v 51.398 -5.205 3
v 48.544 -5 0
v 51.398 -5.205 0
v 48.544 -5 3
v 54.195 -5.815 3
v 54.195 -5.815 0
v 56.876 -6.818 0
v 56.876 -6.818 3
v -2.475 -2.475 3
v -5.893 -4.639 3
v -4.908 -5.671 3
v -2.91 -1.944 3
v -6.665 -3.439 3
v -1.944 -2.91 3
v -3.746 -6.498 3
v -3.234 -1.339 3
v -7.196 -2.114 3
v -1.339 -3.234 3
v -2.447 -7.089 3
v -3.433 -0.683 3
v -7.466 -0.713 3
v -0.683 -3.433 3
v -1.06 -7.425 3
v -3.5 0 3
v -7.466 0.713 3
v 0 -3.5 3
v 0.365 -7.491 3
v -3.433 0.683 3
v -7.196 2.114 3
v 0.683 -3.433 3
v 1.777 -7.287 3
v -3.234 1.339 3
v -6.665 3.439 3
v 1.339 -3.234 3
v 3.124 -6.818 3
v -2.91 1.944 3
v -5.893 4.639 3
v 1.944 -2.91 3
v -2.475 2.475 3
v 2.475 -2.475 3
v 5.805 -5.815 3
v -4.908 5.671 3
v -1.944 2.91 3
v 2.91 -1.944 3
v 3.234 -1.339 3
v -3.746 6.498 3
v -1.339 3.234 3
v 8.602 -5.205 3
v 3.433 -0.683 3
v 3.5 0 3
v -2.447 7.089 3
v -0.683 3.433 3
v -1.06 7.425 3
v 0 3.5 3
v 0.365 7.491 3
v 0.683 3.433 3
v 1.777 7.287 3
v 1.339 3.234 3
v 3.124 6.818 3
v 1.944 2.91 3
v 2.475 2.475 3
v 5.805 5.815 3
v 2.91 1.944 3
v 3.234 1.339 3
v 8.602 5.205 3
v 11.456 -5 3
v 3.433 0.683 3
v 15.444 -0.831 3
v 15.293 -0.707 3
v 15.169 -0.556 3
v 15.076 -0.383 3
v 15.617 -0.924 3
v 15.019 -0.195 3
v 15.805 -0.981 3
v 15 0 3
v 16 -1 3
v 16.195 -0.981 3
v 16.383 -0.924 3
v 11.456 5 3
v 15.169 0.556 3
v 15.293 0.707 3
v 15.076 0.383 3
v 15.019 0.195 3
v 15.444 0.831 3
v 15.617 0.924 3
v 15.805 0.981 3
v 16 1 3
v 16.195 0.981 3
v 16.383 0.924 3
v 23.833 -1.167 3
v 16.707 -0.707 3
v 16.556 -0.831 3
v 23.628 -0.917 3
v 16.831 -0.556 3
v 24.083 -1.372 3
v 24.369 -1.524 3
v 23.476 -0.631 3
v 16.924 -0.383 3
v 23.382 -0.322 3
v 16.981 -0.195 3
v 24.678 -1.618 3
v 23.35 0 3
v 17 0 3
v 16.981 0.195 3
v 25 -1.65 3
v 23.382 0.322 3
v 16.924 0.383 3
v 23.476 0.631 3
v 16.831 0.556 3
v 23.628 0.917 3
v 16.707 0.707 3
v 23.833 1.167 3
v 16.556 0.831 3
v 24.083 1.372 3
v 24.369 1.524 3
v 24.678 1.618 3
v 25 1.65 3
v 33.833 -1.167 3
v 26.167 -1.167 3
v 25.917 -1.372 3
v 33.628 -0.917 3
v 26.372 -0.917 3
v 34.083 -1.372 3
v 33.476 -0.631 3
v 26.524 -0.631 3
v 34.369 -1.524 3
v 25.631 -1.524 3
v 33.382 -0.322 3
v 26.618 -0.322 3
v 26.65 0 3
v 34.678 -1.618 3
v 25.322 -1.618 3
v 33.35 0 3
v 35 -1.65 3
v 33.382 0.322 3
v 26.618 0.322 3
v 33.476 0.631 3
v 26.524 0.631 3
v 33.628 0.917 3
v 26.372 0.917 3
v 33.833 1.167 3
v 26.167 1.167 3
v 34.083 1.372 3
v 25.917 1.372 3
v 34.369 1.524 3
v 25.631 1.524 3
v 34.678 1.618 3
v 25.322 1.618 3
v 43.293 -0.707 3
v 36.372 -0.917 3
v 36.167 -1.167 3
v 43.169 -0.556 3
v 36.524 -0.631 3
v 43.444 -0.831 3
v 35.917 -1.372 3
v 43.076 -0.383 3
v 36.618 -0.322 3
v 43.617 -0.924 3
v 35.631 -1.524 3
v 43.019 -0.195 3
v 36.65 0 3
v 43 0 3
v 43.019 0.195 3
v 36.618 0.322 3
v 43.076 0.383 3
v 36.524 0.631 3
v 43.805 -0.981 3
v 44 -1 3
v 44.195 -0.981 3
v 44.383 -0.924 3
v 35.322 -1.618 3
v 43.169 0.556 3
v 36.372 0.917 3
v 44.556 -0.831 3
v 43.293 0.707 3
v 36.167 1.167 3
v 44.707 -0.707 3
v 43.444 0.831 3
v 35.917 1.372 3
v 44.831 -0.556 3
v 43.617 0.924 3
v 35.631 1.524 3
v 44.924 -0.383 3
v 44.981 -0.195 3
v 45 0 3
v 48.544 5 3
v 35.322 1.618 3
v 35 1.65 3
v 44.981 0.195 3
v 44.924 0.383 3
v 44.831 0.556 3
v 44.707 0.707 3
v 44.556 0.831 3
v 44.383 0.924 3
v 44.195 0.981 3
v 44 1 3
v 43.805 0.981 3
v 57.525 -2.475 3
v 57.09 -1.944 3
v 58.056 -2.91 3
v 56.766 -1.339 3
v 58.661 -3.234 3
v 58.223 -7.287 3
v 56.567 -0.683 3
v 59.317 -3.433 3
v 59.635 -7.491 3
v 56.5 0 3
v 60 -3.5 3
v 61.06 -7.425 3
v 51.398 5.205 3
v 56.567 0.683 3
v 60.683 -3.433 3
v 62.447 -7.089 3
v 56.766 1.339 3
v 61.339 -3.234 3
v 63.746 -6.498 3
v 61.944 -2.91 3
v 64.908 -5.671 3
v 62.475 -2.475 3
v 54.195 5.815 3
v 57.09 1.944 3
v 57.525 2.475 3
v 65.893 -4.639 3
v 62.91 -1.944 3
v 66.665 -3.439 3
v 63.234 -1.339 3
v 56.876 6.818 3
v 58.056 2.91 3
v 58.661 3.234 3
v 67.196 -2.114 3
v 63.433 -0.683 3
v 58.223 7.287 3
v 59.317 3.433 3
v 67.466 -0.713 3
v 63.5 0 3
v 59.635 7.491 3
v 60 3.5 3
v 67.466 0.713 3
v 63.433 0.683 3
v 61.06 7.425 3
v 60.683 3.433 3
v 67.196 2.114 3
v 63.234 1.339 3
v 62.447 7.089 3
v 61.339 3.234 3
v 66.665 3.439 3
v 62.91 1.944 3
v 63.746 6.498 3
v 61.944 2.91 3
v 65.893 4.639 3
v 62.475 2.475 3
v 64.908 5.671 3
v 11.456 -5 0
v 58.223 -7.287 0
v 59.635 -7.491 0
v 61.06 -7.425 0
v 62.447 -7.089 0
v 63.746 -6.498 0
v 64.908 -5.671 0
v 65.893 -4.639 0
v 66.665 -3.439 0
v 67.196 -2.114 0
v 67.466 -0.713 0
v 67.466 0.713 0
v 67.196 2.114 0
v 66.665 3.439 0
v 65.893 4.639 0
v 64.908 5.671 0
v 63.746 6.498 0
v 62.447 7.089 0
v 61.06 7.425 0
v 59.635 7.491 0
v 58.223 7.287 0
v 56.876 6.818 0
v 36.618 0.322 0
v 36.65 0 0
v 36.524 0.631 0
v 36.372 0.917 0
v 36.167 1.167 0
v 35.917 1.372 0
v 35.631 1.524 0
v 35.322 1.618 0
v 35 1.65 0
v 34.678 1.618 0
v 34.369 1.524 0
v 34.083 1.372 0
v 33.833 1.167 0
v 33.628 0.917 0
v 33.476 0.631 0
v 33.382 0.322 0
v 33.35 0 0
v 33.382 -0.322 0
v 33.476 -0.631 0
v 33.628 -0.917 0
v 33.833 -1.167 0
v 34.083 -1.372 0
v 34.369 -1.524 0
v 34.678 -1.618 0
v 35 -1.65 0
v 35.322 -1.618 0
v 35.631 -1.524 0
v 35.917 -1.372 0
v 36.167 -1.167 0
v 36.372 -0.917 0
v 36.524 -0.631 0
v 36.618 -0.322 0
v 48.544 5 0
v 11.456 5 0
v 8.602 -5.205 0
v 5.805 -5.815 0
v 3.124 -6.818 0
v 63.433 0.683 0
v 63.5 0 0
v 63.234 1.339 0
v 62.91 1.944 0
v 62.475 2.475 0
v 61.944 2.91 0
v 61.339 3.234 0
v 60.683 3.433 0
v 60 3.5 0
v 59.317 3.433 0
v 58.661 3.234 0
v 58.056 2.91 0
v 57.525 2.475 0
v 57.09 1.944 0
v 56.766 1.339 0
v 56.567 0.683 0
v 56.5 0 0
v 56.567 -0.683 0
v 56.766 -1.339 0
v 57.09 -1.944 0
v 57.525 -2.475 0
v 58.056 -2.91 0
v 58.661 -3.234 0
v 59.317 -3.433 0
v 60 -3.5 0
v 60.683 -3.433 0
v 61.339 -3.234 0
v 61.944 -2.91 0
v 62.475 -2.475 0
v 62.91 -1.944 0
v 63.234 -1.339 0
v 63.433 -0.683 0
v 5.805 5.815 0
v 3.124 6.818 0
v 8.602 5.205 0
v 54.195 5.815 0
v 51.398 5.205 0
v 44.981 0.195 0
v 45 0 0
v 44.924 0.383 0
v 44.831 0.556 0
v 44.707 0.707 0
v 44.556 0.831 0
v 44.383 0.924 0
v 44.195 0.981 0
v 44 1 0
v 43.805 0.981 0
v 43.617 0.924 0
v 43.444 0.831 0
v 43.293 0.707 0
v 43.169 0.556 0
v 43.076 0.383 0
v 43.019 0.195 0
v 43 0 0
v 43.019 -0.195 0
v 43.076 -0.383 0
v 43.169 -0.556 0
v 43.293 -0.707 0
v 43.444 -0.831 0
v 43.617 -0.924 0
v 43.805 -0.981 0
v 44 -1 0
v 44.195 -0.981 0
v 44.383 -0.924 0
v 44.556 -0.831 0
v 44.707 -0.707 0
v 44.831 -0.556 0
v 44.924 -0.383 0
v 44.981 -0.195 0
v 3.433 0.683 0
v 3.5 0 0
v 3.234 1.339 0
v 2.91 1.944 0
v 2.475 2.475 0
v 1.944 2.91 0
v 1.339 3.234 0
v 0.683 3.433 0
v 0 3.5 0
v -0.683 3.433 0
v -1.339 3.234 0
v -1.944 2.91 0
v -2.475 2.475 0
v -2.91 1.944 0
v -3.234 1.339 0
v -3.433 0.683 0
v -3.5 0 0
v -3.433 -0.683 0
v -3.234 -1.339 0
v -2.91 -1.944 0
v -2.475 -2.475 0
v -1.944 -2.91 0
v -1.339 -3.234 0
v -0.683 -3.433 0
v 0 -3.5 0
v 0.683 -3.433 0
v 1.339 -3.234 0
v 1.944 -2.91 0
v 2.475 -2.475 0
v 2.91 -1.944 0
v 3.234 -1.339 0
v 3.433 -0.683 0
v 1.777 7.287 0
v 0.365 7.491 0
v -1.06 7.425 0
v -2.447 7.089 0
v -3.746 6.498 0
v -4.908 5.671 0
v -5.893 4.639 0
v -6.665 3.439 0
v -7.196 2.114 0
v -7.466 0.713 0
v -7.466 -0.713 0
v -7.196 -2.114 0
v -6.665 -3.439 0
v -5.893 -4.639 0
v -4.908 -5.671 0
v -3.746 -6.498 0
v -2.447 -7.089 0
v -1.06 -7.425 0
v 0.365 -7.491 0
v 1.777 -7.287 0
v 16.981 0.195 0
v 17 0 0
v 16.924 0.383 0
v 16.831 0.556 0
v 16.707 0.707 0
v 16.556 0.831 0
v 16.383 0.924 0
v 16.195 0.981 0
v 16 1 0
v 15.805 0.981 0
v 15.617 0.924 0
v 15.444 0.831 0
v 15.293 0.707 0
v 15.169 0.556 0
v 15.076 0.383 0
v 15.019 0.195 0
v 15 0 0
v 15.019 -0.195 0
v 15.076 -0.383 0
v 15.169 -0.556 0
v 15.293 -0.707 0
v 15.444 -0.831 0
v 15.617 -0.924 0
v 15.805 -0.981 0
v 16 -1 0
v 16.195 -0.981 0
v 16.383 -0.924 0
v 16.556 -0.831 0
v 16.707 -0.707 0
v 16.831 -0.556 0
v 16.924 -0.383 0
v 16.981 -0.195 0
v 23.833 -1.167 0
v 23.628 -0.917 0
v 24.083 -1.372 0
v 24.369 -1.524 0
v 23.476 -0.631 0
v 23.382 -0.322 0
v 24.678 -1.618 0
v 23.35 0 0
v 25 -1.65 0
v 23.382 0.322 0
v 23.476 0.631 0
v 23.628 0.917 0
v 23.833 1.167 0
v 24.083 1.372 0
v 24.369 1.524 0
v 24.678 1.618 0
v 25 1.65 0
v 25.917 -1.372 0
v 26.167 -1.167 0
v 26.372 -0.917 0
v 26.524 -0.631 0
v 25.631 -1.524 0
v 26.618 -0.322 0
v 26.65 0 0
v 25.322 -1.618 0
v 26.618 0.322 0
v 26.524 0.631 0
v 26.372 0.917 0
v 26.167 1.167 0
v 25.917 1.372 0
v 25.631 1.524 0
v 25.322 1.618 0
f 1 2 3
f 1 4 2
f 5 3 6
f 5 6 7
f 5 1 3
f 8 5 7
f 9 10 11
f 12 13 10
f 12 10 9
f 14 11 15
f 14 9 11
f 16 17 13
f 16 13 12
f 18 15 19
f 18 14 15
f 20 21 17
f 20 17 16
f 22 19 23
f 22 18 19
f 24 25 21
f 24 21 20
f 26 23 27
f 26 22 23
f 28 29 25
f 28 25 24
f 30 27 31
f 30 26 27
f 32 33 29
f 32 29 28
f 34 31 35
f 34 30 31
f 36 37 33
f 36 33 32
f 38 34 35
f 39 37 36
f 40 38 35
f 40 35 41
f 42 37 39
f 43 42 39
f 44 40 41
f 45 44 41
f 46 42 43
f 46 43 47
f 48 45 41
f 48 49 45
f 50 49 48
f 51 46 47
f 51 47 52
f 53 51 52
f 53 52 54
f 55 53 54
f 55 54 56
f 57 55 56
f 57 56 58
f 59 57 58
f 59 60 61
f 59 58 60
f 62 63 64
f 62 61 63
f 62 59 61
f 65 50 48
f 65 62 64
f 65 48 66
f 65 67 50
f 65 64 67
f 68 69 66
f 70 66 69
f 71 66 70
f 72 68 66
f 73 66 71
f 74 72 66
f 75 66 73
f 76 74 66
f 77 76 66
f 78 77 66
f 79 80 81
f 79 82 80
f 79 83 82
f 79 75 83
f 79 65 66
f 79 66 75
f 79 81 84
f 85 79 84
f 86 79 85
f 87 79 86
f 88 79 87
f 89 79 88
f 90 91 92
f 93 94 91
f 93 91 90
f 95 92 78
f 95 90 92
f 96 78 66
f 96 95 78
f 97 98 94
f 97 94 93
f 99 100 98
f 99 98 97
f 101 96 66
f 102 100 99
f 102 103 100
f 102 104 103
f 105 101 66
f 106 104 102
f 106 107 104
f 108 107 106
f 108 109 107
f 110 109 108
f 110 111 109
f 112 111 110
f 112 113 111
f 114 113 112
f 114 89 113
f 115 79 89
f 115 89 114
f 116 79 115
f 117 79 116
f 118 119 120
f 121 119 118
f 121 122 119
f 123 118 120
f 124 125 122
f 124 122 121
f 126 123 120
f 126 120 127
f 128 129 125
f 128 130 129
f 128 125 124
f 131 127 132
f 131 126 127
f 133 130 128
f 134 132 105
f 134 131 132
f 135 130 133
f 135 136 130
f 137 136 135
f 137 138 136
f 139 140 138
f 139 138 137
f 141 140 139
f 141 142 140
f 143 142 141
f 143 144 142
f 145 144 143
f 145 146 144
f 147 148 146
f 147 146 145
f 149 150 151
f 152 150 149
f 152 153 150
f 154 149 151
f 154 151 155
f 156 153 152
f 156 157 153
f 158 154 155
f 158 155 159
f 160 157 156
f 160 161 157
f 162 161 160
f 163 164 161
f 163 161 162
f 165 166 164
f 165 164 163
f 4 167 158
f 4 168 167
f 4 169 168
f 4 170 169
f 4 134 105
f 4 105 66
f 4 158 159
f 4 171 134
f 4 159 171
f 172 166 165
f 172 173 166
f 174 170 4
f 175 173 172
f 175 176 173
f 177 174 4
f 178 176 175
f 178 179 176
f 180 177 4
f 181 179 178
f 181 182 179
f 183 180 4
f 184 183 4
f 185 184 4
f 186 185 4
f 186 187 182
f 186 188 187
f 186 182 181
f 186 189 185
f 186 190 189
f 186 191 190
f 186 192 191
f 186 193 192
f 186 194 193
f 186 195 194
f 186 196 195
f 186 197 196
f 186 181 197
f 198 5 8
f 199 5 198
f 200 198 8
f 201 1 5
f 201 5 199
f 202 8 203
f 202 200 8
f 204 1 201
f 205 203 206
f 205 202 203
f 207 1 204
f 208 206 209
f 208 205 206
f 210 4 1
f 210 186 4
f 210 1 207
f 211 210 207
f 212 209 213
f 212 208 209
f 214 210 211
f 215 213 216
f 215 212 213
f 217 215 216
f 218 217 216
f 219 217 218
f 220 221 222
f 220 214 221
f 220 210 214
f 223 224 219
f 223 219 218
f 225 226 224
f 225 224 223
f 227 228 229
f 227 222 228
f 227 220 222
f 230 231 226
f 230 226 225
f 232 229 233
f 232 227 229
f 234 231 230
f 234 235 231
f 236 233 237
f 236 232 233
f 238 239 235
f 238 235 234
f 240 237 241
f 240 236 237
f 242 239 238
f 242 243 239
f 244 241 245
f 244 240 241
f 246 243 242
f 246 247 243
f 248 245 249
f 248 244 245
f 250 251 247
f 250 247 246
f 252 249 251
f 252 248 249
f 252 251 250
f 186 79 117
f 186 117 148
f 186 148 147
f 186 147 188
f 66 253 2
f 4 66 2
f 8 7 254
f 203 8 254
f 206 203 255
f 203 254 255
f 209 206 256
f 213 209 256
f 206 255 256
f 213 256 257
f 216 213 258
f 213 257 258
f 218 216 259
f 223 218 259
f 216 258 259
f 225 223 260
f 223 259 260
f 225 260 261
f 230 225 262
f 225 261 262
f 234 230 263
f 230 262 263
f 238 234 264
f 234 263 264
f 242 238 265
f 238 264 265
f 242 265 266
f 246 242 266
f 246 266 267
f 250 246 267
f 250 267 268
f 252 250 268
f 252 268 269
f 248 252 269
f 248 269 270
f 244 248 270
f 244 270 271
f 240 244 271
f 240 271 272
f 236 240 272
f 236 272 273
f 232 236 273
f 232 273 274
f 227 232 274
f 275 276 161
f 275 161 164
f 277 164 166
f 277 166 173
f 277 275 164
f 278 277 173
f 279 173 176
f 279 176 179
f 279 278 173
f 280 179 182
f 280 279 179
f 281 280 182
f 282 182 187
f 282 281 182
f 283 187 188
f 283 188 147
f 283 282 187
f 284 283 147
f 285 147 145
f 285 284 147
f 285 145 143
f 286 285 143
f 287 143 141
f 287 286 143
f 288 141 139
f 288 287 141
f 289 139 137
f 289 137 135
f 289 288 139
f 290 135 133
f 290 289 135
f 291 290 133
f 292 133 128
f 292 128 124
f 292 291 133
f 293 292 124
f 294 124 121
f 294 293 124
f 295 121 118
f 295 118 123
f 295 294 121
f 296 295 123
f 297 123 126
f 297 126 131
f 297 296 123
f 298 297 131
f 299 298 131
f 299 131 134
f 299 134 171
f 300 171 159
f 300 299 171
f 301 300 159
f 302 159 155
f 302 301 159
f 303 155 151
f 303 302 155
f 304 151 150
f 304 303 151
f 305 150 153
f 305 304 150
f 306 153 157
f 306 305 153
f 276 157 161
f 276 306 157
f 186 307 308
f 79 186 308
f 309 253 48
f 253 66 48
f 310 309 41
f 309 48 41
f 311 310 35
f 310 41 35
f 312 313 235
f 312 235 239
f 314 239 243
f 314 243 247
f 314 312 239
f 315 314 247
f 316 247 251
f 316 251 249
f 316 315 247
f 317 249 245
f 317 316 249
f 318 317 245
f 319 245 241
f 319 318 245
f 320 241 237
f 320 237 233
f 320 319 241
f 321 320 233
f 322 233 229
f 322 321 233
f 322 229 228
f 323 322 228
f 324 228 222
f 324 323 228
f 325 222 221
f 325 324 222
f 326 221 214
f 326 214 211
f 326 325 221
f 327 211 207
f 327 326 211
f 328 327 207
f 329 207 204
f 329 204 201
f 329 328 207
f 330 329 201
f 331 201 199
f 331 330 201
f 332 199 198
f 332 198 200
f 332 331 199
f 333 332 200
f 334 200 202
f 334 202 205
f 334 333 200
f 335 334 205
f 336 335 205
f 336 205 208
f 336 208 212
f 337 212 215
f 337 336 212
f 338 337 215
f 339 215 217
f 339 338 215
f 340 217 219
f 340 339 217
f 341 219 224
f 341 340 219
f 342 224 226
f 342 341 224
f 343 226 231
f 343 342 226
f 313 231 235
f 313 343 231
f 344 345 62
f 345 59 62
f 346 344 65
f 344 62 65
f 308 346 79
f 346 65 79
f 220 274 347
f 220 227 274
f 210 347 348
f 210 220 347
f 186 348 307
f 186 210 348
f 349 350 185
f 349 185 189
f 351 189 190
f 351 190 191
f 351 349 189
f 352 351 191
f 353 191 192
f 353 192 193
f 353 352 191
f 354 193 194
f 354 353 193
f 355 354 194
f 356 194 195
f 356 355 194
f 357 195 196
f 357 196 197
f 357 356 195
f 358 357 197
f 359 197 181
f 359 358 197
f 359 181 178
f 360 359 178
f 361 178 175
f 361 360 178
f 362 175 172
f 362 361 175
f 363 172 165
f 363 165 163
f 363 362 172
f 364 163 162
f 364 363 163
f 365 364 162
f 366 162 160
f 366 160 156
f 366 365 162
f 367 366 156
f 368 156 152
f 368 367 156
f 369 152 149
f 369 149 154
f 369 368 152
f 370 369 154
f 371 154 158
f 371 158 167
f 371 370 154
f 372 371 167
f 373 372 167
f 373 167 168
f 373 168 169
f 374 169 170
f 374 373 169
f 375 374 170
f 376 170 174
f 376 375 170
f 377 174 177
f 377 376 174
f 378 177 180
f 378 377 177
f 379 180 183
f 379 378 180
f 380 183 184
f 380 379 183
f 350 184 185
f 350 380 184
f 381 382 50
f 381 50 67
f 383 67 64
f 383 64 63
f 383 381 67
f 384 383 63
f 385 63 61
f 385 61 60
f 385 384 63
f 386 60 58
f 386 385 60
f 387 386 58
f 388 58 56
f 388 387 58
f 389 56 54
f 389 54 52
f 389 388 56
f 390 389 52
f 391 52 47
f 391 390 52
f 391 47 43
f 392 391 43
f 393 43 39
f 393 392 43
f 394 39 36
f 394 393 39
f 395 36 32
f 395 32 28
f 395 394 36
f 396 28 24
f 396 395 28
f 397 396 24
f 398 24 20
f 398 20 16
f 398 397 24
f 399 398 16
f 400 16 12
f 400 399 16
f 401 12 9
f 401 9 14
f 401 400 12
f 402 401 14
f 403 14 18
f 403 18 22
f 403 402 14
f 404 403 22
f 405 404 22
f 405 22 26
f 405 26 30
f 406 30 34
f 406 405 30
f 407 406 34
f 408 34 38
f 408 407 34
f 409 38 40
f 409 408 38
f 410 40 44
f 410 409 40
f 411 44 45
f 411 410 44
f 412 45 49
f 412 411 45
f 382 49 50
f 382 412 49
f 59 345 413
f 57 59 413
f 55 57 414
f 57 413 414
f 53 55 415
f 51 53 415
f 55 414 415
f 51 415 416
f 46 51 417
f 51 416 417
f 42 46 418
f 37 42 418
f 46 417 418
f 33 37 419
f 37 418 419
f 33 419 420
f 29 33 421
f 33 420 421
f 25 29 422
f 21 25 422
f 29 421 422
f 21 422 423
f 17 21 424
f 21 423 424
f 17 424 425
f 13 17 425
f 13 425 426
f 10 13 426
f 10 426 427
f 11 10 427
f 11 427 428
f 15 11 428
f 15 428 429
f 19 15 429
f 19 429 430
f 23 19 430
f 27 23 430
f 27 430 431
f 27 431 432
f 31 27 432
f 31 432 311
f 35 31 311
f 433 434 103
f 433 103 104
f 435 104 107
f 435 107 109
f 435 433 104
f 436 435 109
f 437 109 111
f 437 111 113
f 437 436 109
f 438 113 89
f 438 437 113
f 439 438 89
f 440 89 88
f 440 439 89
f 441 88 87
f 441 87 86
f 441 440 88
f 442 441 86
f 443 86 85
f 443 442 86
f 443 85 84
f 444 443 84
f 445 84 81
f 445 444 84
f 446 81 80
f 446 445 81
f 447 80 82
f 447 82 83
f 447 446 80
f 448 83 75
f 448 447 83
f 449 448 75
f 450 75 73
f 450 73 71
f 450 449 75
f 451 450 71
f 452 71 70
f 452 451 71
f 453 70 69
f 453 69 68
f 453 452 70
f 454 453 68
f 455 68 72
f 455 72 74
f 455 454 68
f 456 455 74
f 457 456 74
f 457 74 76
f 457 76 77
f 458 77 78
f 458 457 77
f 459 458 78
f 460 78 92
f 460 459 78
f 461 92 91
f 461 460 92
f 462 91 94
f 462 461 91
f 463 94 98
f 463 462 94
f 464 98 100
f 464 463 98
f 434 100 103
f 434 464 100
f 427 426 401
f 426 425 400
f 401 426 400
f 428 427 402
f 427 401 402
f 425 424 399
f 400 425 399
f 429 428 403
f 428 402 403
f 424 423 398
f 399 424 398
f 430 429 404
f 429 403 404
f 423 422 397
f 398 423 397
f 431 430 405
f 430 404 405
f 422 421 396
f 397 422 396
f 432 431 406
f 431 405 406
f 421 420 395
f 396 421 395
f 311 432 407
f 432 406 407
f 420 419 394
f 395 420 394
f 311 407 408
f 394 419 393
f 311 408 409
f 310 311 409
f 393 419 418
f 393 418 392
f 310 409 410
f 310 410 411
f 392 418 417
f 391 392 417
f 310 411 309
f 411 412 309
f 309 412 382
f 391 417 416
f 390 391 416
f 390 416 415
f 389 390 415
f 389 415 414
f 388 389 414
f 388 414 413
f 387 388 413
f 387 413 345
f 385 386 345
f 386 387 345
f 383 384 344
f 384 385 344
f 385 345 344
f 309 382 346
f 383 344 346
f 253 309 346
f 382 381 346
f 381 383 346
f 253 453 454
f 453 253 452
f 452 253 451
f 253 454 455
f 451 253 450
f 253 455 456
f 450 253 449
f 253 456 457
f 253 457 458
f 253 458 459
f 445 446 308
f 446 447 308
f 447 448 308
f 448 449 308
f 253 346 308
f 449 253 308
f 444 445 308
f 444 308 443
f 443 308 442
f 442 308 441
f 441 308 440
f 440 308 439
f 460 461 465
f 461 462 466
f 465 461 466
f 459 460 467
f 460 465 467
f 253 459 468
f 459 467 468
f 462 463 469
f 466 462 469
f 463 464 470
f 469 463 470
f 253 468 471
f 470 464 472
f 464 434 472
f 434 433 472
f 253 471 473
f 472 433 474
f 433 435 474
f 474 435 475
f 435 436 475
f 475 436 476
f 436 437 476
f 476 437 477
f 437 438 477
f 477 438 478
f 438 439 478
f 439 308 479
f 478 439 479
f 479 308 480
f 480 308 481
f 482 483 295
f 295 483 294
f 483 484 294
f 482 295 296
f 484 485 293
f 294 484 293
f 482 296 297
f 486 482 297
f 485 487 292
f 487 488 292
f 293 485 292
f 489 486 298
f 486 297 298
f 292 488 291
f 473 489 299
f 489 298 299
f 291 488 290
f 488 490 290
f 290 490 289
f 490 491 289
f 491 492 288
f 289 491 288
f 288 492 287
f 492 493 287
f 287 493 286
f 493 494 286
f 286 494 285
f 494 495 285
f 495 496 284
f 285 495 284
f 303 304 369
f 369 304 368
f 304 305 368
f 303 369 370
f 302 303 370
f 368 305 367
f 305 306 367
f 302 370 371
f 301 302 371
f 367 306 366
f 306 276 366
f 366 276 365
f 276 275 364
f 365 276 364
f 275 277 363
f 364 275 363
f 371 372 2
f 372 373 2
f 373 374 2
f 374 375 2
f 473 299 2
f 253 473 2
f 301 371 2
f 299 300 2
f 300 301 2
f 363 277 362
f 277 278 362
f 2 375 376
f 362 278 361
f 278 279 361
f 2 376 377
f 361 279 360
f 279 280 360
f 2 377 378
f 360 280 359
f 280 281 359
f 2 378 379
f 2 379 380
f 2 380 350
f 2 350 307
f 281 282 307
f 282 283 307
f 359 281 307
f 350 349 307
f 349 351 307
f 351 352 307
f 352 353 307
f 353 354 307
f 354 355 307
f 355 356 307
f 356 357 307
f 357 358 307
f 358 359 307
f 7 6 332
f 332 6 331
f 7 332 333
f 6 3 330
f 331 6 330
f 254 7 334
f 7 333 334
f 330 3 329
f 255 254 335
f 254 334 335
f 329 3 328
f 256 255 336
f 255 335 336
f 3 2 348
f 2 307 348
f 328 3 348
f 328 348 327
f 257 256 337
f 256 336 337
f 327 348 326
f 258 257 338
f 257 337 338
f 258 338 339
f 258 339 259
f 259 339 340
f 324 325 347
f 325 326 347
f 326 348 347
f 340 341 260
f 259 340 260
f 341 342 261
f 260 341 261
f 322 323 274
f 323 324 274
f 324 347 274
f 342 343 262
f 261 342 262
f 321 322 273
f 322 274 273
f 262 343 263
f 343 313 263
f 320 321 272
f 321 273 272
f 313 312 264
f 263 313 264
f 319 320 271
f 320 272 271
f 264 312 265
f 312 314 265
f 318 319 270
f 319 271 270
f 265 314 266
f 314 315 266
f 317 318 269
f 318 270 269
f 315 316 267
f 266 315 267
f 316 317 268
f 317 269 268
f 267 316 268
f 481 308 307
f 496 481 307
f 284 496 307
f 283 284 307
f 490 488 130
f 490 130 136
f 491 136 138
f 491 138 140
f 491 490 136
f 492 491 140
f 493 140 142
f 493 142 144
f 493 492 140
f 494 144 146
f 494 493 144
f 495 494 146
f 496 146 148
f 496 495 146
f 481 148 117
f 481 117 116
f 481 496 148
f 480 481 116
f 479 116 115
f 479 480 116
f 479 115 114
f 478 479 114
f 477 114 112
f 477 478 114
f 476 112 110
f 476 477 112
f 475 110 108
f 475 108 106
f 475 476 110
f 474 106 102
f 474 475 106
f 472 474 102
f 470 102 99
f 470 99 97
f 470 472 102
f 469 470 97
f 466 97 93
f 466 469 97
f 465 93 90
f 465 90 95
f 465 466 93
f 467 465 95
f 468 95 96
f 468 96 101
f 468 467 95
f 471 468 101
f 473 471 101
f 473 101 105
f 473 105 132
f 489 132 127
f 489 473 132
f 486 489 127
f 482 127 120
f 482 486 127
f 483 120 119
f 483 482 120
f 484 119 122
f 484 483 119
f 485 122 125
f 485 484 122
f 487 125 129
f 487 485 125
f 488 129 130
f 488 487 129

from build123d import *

# Parameters (mm, degrees)
ESBO_O1_R                = 1
ESBO_O1_R_2              = 3.5
ESBO_O1_R_3              = 1.65
RESSALTO_EXTRUS_O1_DEPTH = 3
FILETE1_R                = 20


with BuildPart() as part:
    # Esboço1 → Ressalto-extrusão1 (new body)
    with BuildSketch(Plane.XY):
        with BuildLine():
            Line((5.590169944, -5), (54.409830056, -5))
            ThreePointArc((54.409830056, -5), (67.5, 0), (54.409830056, 5))
            Line((54.409830056, 5), (5.590169944, 5))
            ThreePointArc((5.590169944, 5), (-7.5, 0), (5.590169944, -5))
        make_face()
        with Locations((44, 0)):
            Circle(ESBO_O1_R, mode=Mode.SUBTRACT)
        with Locations((16, 0)):
            Circle(ESBO_O1_R, mode=Mode.SUBTRACT)
        Circle(ESBO_O1_R_2, mode=Mode.SUBTRACT)
        with Locations((60, 0)):
            Circle(ESBO_O1_R_2, mode=Mode.SUBTRACT)
        with Locations((25, 0)):
            Circle(ESBO_O1_R_3, mode=Mode.SUBTRACT)
        with Locations((35, 0)):
            Circle(ESBO_O1_R_3, mode=Mode.SUBTRACT)
    extrude(amount=RESSALTO_EXTRUS_O1_DEPTH)

    # Filete1
    filete1_edges = [part.edges().sort_by_distance(p)[0] for p in [
        (54.409830056, -5, 1.5),
        (5.590169944, -5, 1.5),
        (5.590169944, 5, 1.5),
        (54.409830056, 5, 1.5),
    ]]
    fillet(filete1_edges, radius=FILETE1_R)


solid = part.part
